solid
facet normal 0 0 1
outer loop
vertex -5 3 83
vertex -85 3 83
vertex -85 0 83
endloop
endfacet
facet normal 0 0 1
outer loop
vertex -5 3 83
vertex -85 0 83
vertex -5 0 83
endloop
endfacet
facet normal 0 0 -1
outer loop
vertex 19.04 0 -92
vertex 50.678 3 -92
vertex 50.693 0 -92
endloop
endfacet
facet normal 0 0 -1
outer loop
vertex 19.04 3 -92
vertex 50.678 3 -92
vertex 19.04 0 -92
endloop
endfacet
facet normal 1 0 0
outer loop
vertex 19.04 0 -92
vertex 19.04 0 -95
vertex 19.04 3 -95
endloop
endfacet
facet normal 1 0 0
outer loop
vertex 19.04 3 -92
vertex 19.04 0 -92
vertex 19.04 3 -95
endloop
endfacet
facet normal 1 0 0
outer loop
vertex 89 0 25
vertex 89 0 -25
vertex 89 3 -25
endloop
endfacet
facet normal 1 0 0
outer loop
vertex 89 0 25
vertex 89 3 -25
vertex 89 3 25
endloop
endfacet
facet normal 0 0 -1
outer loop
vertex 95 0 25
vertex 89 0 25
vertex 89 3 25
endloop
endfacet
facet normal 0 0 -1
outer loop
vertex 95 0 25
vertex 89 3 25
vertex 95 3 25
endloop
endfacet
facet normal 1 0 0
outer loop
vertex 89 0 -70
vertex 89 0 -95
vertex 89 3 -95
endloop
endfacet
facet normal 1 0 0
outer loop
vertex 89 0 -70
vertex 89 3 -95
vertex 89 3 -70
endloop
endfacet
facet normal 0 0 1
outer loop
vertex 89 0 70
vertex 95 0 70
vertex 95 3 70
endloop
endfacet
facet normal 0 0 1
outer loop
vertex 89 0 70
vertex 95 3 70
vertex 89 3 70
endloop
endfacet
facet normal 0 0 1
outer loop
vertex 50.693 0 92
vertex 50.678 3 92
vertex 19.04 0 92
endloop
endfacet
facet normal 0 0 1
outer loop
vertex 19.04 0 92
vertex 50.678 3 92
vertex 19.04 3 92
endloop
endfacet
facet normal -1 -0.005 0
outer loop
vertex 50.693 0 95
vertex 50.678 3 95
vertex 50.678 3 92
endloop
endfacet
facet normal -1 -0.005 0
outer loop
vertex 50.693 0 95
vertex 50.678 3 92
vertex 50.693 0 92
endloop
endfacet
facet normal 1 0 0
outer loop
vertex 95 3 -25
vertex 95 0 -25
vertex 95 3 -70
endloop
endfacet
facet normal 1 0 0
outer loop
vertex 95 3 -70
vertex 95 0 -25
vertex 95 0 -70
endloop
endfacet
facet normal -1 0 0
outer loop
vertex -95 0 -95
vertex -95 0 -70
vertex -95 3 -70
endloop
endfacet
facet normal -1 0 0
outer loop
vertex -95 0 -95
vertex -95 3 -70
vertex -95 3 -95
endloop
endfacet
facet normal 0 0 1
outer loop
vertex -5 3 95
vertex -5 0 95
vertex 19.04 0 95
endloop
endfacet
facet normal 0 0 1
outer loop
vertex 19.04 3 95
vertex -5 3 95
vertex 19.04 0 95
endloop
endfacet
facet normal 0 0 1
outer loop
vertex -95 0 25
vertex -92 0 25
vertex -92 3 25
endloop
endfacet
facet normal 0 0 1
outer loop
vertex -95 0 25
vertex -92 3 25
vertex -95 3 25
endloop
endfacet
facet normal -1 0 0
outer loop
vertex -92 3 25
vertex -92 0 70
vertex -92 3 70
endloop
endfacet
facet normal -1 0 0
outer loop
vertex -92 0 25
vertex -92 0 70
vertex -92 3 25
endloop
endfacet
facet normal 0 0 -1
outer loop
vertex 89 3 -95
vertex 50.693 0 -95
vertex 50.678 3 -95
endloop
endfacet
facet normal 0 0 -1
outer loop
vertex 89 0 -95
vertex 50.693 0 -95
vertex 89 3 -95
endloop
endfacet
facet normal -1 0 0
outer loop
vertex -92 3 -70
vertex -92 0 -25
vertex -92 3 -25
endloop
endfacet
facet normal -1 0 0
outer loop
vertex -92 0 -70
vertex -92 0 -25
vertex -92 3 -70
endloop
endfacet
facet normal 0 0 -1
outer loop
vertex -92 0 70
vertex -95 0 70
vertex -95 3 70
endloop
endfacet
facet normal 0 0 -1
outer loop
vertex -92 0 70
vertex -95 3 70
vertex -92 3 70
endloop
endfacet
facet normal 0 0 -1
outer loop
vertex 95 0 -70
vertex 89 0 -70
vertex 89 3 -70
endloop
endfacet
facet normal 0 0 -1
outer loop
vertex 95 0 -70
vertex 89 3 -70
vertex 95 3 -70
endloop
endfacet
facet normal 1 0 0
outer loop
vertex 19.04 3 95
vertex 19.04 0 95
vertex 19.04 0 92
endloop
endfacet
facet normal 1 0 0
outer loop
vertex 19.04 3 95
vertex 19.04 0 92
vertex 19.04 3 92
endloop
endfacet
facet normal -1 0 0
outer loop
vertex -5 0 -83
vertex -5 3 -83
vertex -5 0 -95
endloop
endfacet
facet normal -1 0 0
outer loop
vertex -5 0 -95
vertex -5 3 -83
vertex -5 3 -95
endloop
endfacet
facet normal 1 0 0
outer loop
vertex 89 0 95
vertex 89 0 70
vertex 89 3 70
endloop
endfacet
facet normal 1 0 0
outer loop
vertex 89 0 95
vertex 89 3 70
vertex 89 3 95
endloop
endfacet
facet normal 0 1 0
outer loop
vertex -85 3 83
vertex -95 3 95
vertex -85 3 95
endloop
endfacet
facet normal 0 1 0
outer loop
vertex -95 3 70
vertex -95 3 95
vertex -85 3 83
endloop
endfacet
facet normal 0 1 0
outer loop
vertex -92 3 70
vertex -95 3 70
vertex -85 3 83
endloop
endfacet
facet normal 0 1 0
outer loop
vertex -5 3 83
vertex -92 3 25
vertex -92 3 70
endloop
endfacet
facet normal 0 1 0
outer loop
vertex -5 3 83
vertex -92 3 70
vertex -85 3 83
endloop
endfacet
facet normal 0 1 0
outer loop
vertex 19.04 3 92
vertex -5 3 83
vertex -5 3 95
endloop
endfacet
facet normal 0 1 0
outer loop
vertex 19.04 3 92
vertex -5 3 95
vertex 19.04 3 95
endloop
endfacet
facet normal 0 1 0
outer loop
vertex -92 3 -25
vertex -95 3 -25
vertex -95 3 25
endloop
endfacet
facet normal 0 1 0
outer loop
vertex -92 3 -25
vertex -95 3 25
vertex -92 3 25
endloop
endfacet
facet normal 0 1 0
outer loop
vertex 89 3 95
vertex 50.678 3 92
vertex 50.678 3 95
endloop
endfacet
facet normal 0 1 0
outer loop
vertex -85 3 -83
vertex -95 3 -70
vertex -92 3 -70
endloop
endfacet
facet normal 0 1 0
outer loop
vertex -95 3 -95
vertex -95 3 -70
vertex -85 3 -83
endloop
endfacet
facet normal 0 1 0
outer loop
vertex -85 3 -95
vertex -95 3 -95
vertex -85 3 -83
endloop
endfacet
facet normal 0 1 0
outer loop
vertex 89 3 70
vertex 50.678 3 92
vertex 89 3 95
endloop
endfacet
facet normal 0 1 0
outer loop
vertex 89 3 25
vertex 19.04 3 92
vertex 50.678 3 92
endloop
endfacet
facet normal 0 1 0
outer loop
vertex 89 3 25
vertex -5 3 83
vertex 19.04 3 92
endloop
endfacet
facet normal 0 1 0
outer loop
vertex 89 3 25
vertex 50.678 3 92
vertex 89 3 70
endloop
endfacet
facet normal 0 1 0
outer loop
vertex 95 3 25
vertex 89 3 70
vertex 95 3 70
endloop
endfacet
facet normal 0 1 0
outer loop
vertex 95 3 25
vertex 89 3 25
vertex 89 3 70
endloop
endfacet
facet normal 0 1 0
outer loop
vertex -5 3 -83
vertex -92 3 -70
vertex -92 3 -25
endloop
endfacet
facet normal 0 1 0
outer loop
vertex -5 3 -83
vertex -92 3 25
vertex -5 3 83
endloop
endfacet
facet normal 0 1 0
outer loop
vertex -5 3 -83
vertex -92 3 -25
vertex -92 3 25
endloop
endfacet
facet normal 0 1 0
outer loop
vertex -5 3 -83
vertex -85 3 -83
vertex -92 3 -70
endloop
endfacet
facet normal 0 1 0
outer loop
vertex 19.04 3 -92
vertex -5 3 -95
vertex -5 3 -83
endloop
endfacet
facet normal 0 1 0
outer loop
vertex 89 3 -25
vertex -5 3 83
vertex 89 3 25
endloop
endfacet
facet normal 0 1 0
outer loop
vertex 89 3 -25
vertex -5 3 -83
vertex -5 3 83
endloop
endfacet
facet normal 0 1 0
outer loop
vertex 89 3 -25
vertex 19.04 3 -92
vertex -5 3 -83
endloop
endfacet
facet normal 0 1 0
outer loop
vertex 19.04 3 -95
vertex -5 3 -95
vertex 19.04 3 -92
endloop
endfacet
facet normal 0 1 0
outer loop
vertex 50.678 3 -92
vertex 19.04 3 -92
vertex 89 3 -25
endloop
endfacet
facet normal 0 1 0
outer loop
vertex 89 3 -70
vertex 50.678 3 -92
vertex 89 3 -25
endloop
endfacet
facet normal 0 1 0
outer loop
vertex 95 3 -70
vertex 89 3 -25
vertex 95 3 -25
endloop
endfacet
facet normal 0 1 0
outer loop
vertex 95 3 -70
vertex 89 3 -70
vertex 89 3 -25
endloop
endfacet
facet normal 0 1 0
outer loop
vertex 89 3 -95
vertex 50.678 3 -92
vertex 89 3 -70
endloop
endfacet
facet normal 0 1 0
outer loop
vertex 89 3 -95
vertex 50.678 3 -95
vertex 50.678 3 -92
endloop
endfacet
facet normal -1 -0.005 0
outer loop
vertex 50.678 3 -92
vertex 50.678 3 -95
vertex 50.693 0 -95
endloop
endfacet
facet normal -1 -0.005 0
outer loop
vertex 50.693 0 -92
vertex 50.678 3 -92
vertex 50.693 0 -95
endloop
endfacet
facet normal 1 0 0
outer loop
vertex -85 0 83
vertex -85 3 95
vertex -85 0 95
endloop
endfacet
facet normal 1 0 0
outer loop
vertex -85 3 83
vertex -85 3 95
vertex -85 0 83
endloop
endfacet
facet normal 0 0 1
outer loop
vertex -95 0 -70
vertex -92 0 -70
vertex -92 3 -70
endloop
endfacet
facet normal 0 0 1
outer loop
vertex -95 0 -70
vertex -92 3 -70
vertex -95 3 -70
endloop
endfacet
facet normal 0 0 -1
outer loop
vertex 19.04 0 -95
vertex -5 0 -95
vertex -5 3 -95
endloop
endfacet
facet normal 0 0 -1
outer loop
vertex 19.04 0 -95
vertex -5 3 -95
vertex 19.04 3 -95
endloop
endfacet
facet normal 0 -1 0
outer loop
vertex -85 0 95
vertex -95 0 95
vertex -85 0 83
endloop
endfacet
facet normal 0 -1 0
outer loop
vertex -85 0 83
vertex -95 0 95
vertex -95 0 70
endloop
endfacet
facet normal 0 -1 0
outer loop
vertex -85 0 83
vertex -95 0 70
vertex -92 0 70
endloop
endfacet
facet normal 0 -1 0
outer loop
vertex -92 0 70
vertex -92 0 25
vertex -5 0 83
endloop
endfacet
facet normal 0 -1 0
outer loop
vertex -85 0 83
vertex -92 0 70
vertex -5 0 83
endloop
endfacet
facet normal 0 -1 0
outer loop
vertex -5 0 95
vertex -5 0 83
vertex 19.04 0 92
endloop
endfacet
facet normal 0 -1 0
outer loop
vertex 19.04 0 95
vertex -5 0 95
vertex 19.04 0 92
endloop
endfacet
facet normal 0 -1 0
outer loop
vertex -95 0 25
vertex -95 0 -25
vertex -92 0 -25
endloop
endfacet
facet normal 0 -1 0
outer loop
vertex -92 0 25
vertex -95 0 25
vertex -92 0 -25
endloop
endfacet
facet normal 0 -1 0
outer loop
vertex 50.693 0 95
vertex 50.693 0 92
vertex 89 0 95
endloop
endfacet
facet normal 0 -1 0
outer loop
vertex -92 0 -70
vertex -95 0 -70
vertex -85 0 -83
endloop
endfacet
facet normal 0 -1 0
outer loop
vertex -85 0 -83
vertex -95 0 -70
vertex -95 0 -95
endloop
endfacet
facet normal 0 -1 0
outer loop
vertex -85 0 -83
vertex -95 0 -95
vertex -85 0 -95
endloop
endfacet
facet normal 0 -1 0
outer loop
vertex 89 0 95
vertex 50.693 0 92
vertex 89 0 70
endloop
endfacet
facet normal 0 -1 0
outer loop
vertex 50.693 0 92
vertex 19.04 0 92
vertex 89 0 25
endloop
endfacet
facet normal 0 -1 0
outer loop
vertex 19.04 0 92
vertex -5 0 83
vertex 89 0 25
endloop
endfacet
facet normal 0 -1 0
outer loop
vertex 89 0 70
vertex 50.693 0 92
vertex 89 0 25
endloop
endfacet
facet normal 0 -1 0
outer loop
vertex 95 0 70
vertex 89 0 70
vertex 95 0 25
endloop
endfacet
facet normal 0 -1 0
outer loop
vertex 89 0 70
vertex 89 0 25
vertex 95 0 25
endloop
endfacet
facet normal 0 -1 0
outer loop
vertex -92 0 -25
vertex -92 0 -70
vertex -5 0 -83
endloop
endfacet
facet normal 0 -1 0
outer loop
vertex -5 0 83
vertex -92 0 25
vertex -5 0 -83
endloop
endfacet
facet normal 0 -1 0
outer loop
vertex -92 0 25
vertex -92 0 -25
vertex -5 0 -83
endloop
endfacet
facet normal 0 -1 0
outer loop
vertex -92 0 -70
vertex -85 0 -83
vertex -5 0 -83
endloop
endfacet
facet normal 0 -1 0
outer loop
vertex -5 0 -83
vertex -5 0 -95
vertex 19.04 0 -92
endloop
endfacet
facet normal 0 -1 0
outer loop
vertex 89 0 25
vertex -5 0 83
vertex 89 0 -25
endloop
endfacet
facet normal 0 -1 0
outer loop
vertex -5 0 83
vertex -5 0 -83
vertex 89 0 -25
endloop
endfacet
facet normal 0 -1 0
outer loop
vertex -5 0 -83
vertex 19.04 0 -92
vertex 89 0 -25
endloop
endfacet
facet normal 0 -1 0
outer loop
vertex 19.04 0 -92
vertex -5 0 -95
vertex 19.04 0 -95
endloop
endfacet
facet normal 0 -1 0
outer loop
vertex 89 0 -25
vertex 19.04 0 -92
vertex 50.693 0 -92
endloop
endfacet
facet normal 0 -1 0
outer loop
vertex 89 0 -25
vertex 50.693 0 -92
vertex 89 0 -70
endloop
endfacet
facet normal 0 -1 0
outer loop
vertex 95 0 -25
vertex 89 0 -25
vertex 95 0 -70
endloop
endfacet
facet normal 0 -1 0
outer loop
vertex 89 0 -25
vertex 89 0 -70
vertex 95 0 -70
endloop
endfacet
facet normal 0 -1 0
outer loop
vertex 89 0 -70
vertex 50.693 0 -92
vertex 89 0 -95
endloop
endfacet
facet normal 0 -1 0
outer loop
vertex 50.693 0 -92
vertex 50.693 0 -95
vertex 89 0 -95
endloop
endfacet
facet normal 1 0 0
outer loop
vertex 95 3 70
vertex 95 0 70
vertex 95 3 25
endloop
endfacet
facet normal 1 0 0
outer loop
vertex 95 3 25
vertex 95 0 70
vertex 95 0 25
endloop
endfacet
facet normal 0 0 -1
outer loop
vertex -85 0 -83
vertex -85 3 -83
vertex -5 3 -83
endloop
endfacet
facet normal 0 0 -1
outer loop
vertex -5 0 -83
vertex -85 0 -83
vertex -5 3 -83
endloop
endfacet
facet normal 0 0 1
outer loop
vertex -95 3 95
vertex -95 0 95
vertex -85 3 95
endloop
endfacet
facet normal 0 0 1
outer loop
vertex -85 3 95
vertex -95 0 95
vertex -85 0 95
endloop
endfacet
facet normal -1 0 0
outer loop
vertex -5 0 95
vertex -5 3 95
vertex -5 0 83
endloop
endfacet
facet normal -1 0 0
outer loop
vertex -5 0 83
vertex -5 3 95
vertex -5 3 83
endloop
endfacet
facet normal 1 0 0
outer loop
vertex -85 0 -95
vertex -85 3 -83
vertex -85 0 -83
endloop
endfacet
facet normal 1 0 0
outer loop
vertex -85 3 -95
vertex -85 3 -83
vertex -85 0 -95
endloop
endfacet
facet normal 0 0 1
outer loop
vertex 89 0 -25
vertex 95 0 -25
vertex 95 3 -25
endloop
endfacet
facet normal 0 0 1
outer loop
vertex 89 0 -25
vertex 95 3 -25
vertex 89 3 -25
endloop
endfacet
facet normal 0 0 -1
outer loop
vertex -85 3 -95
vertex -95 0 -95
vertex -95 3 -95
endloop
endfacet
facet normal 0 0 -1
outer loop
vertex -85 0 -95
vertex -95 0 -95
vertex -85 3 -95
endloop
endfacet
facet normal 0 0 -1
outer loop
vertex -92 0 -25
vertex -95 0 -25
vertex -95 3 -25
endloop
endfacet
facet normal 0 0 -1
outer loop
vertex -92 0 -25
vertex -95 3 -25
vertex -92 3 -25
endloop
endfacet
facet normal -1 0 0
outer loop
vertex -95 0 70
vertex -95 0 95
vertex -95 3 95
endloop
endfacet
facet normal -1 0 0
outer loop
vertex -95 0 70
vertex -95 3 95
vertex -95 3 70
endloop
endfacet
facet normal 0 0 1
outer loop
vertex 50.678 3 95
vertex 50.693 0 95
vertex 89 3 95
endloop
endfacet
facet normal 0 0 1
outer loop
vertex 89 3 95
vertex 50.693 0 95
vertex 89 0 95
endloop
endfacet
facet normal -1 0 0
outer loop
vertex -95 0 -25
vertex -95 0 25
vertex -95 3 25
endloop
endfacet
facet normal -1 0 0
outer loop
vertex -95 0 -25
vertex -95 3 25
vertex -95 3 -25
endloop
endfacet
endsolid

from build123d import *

# Parameters (mm, degrees)
SKETCH1_W               = 190
SKETCH1_H               = 190
BOSS_EXTRUDE1_DEPTH     = 3
CUT_EXTRUDE2_DEPTH      = 135.383778783
CUT_EXTRUDE2_DEPTH_BACK = 3
SKETCH2_OUTSIDE_W       = 245.744
SKETCH2_OUTSIDE_H       = 245.744
SKETCH4_W               = 80
SKETCH4_H               = 12
CUT_EXTRUDE4_DEPTH      = 3
CUT_EXTRUDE5_DEPTH      = 3


with BuildPart() as part:
    # Sketch1 → Boss-Extrude1 (new body)
    with BuildSketch(Plane(origin=(0, 0, 0), x_dir=(1, 0, 0), z_dir=(0, 1, 0))):
        Rectangle(SKETCH1_W, SKETCH1_H)
    extrude(amount=BOSS_EXTRUDE1_DEPTH)

    # Sketch2 outside → Cut-Extrude2 (cut, two sides: drawn at the far end of the back side and taken through both)
    with BuildSketch(Plane(origin=(0, 3, 0), x_dir=(1, 0, 0), z_dir=(0, 1, 0)).offset(-CUT_EXTRUDE2_DEPTH_BACK)):
        Rectangle(SKETCH2_OUTSIDE_W, SKETCH2_OUTSIDE_H)
        Polygon((-95, -95), (-95, -70), (-92, -70), (-92, -25), (-95, -25), (-95, 25), (-92, 25), (-92, 70), (-95, 70), (-95, 95), (89, 95), (89, 70), (95, 70), (95, 25), (89, 25), (89, -25), (95, -25), (95, -70), (89, -70), (89, -95), align=None, mode=Mode.SUBTRACT)
    extrude(amount=CUT_EXTRUDE2_DEPTH + CUT_EXTRUDE2_DEPTH_BACK, mode=Mode.SUBTRACT)

    # Sketch4 → Cut-Extrude4 (cut)
    with BuildSketch(Plane(origin=(0, 3, 0), x_dir=(1, 0, 0), z_dir=(0, 1, 0))):
        with Locations((-45, 89)):
            Rectangle(SKETCH4_W, SKETCH4_H)
        with Locations((-45, -89)):
            Rectangle(SKETCH4_W, SKETCH4_H)
    extrude(amount=-CUT_EXTRUDE4_DEPTH, mode=Mode.SUBTRACT)

    # Sketch5 → Cut-Extrude5 (cut)
    with BuildSketch(Plane.XY.offset(95)):
        Polygon((50.678414624, 3), (50.692948093, 0), (19.039732141, 0), (19.039732141, 3), align=None)
    cut_extrude5 = extrude(amount=-CUT_EXTRUDE5_DEPTH, mode=Mode.SUBTRACT)

    # Mirror1: Cut-Extrude5 across plane
    add(cut_extrude5.mirror(Plane.XY), mode=Mode.SUBTRACT)


solid = part.part
